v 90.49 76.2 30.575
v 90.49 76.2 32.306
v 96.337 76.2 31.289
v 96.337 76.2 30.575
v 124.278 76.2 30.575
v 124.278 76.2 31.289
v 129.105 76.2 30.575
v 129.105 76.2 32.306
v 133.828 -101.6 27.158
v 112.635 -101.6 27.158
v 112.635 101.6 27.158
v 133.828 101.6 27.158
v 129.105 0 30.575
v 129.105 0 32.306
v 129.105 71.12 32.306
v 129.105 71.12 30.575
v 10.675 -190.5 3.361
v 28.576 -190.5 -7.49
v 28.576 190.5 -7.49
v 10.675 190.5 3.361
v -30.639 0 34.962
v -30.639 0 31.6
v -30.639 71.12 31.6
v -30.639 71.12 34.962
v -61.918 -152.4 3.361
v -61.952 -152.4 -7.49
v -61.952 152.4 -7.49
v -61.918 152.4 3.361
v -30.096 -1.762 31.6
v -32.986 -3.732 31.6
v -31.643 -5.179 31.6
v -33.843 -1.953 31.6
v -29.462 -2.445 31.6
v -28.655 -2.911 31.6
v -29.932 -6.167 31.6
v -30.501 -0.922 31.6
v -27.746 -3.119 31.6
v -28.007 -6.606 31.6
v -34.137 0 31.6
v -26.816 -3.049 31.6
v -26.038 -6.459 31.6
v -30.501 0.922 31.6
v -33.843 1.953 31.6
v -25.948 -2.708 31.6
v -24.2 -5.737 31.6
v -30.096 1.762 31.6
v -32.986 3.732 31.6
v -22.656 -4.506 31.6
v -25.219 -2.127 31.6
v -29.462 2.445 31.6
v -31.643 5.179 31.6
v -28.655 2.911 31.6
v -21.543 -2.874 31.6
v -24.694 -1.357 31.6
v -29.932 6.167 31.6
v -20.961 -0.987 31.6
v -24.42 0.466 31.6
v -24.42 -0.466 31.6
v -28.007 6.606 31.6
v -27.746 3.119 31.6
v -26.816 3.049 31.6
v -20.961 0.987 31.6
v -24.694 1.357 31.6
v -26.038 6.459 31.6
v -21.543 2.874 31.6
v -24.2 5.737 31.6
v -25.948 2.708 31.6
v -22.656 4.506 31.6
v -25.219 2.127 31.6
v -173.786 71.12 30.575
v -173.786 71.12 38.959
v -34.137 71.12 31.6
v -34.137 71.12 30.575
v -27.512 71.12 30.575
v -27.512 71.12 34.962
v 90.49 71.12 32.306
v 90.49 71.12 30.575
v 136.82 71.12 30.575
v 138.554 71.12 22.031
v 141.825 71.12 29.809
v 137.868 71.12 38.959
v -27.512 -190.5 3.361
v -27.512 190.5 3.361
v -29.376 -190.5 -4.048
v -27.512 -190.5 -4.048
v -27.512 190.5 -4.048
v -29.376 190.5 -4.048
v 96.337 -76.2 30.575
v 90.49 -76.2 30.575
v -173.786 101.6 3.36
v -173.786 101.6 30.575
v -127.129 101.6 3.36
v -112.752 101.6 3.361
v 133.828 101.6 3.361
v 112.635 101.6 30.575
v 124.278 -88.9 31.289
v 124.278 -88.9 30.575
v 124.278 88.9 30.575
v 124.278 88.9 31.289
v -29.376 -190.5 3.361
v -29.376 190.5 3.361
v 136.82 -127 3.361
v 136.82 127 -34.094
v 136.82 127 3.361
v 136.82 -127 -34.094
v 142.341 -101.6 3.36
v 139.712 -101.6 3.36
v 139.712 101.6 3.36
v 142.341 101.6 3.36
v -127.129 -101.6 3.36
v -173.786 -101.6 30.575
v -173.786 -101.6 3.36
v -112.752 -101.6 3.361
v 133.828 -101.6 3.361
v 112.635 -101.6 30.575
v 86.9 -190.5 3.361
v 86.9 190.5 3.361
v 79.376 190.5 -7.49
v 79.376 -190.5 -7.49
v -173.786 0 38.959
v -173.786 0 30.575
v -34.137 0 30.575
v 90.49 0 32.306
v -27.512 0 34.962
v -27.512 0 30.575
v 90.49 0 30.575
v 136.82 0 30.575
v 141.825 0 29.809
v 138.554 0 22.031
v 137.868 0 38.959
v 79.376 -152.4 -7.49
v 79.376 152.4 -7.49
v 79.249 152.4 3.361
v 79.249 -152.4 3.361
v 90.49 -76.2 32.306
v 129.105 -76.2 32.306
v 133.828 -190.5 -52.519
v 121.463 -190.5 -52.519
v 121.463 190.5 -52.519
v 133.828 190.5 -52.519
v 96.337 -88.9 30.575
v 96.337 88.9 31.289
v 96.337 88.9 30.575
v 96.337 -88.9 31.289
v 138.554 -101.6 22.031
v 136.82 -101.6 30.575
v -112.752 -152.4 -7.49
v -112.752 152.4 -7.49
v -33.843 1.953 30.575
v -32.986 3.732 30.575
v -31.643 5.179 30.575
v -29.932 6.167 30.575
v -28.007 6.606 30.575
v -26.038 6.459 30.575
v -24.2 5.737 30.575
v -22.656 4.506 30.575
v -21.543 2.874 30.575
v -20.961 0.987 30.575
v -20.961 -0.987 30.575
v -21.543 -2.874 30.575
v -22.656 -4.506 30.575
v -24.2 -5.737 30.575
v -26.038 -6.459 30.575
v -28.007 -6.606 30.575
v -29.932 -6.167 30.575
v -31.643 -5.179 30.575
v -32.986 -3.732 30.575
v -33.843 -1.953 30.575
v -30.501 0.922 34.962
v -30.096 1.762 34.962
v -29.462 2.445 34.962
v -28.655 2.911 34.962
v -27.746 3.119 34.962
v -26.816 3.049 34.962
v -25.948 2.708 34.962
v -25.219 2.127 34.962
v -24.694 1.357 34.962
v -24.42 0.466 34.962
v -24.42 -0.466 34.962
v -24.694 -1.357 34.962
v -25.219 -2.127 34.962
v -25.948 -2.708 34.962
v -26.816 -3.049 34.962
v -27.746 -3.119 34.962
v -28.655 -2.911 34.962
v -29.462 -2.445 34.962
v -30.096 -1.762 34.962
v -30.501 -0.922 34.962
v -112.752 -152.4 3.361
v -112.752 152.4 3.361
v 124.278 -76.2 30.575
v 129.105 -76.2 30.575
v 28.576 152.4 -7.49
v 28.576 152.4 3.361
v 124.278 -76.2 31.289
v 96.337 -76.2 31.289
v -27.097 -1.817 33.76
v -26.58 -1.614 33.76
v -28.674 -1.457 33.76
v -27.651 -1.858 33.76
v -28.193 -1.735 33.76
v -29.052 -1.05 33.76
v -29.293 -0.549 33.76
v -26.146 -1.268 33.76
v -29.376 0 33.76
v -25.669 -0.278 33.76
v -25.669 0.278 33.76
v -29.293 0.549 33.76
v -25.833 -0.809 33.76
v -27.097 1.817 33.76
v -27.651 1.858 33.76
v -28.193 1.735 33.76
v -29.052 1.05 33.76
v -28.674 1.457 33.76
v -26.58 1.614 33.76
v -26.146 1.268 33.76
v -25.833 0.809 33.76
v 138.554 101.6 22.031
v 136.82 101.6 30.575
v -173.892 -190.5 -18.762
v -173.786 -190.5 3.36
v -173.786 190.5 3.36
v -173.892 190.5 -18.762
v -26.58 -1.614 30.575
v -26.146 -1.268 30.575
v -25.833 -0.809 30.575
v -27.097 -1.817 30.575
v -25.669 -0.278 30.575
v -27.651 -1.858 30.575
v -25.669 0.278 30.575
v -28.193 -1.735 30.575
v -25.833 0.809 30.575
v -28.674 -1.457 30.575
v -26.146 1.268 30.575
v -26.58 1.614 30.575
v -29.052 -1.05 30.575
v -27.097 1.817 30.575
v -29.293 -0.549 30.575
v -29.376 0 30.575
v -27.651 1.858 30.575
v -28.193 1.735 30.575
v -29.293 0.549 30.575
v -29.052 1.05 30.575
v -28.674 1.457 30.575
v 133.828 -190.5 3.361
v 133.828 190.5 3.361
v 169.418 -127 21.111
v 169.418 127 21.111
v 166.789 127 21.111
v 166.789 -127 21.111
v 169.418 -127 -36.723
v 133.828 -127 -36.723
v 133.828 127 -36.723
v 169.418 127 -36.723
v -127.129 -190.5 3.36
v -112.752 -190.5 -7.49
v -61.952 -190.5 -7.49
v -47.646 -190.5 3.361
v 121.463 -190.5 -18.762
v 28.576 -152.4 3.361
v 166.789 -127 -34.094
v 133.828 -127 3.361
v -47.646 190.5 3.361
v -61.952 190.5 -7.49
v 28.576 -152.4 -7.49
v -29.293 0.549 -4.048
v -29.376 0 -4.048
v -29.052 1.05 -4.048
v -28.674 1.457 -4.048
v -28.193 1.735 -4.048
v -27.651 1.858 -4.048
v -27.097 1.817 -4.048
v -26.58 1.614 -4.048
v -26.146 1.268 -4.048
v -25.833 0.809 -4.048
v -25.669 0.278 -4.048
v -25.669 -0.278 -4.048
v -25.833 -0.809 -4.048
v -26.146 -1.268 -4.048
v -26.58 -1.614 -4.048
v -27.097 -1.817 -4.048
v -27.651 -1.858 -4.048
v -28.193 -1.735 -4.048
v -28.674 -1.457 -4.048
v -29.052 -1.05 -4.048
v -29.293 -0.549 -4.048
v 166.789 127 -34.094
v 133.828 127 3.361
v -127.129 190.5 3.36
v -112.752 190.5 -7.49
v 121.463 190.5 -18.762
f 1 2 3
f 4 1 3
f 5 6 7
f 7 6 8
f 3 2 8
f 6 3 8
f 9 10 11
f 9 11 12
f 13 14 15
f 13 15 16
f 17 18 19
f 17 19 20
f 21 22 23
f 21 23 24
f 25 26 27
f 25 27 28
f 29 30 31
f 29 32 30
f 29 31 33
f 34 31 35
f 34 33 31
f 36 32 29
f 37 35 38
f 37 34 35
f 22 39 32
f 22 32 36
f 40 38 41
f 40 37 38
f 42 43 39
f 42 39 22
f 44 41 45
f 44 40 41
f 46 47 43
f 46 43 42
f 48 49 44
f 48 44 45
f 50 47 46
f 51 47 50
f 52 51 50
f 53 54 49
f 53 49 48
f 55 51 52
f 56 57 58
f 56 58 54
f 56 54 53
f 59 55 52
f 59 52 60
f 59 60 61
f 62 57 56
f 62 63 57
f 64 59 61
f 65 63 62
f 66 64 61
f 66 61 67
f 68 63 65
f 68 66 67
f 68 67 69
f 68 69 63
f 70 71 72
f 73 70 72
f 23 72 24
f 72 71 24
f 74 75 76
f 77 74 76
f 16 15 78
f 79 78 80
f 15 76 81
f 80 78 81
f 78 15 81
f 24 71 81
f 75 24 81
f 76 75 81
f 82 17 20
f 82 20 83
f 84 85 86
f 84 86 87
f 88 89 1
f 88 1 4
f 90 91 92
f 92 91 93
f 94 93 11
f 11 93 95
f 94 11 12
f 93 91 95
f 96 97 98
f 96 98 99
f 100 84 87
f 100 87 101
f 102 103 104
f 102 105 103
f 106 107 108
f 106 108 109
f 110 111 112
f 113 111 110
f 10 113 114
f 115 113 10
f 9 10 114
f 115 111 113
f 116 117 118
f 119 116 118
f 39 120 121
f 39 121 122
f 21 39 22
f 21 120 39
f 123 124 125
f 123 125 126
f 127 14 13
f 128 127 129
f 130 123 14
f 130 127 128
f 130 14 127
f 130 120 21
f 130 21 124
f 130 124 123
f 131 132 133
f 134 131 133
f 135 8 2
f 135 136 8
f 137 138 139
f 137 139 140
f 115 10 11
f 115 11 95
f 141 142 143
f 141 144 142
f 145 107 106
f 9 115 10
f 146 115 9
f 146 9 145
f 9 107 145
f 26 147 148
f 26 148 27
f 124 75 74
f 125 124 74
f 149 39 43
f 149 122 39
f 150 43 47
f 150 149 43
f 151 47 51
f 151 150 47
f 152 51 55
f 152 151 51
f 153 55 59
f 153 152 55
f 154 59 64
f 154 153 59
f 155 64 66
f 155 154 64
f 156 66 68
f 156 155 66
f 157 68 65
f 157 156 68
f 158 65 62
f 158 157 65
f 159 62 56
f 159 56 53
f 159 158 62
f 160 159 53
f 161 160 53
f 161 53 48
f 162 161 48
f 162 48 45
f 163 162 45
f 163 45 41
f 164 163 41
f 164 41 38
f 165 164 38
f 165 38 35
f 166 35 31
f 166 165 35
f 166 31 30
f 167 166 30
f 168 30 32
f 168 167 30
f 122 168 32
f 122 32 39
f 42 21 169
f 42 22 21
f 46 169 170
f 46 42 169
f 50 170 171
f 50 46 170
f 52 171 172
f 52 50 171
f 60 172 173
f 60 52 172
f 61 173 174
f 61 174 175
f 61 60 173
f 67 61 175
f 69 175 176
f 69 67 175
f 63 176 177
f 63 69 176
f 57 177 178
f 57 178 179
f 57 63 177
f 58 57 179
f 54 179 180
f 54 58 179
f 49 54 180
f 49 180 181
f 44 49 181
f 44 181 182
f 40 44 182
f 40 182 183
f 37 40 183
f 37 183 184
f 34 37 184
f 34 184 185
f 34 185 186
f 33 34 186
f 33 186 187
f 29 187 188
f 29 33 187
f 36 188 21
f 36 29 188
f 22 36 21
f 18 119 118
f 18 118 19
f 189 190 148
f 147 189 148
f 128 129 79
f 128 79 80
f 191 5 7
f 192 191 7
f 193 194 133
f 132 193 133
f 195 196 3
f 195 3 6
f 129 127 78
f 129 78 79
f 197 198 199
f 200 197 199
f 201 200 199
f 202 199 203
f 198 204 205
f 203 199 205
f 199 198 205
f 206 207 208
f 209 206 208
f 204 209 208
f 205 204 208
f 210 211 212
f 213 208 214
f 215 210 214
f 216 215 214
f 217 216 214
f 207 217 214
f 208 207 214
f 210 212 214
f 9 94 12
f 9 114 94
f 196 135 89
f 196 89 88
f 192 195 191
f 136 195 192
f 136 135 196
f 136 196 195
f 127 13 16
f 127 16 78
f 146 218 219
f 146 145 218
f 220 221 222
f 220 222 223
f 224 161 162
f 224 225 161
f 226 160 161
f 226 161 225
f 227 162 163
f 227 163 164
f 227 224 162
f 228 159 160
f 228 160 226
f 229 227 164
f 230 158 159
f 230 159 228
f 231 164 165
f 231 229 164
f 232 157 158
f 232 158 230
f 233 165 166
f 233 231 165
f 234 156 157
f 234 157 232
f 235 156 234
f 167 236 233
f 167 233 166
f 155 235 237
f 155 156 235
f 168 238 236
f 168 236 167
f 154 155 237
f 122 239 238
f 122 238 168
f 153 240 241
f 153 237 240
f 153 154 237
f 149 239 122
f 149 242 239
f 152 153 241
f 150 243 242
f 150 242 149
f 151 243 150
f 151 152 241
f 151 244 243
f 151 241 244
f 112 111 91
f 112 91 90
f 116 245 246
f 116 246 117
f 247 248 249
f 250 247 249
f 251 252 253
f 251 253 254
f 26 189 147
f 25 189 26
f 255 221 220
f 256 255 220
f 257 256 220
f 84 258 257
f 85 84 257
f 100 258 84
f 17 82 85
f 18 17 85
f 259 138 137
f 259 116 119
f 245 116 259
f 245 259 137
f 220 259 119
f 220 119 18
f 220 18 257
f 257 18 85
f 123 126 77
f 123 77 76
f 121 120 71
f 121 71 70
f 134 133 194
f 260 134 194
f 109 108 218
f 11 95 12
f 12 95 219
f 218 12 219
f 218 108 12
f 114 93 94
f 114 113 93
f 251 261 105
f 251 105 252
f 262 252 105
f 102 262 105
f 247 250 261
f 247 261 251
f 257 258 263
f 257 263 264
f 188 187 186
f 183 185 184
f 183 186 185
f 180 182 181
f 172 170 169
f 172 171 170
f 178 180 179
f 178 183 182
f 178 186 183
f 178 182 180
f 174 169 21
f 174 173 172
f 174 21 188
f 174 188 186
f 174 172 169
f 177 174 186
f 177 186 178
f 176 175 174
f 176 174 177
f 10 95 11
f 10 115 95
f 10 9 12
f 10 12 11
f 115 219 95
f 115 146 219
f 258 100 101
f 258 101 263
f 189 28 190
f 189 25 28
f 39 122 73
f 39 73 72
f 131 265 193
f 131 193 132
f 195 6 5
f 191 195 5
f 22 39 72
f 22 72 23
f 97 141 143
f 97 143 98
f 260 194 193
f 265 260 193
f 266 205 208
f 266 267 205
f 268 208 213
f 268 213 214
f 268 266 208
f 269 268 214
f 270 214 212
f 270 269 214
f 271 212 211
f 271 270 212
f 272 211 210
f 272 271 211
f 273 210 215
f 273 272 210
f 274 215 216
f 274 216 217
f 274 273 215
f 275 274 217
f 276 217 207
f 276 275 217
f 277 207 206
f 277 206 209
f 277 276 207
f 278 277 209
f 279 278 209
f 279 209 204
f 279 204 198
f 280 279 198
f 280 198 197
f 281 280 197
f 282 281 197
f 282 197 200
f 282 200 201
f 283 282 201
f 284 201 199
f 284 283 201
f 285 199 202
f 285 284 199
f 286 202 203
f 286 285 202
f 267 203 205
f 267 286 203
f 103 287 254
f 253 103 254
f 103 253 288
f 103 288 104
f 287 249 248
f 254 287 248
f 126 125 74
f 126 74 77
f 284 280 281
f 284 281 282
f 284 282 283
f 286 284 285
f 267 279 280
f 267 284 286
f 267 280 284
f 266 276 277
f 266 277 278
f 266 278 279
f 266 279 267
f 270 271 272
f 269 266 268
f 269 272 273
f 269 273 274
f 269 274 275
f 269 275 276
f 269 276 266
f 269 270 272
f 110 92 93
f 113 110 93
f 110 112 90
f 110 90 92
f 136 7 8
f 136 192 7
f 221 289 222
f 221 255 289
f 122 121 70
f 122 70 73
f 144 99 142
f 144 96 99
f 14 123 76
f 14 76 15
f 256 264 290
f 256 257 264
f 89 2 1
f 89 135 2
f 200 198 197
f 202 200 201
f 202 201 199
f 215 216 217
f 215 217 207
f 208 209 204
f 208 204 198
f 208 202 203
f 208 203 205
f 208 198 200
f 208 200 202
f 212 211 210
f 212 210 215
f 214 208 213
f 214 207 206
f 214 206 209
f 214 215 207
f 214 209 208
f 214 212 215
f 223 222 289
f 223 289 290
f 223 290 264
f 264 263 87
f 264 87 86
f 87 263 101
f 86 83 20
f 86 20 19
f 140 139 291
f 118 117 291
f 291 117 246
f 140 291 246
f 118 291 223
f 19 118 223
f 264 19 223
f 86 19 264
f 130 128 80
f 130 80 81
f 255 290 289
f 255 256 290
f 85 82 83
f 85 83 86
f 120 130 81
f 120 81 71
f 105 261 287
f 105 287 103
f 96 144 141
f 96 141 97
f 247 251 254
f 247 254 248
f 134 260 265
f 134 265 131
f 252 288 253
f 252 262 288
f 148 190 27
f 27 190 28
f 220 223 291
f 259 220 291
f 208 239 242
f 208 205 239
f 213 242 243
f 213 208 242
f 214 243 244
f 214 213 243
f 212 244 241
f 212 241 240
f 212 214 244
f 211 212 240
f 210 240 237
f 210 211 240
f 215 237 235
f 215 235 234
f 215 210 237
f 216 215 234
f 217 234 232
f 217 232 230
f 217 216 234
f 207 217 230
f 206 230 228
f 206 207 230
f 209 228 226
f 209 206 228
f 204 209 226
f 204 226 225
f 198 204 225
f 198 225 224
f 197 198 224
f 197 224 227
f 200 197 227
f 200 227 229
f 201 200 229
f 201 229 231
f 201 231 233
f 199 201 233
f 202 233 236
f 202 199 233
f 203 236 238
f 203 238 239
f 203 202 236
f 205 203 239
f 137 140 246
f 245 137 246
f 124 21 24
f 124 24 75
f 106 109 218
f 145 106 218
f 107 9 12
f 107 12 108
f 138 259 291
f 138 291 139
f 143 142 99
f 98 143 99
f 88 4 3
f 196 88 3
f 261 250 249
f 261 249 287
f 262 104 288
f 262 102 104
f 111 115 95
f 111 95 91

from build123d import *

# Parameters (mm, degrees)
F1_DEPTH  = 190.5
F2_DEPTH  = 152.4
F0_W      = 1.8636145309
F0_H      = 27.2141208457
F3_DEPTH  = 101.6
F0_H_2    = 3.1851885769
F0_H_3    = 7.4091651964
F6_DEPTH  = 127
F7_DEPTH  = 101.6
F8_DEPTH  = 88.9
F9_DEPTH  = 76.2
F10_DEPTH = 71.12


with BuildPart() as f1:
    # F0 (on Front) → F1 (new body, symmetric)
    with BuildSketch(Plane.XZ):
        Polygon((-127.1288654061, 3.3602740393), (-173.7859473037, 3.3602740393), (-173.8923100857, -18.7623016536), (121.4632987976, -18.7623016536), (121.4632987976, -52.5190801178), (133.8279108456, -52.5190801178), (133.8279108456, -36.7227010429), (133.8279108456, 3.3609198822), (86.8995636396, 3.3609198822), (79.3755978542, -7.4902105568), (28.5755978542, -7.4902105568), (10.6749085502, 3.3609198822), (-27.5120586157, 3.3609198822), (-27.5120586157, -4.0482453142), (-29.3756731466, -4.0482453142), (-29.3756731466, 3.3609198822), (-47.6464486061, 3.3609198822), (-61.951972467, -7.4902105568), (-112.751972467, -7.4902105568), align=None)
    extrude(amount=F1_DEPTH, both=True)


with BuildPart() as f2:
    # F0 (on Front) → F2 (new body, symmetric)
    with BuildSketch(Plane.XZ):
        Polygon((-112.751972467, 3.3609198822), (-112.751972467, -7.4902105568), (-61.951972467, -7.4902105568), (-61.9183145463, 3.3609198822), align=None)
    extrude(amount=F2_DEPTH, both=True)


with BuildPart() as f2b:
    # F0 (on Front) → F2, piece 2 (new body, symmetric)
    with BuildSketch(Plane.XZ):
        Polygon((28.5755978542, 3.3609198822), (28.5755978542, -7.4902105568), (79.3755978542, -7.4902105568), (79.2492181063, 3.3609198822), align=None)
    extrude(amount=F2_DEPTH, both=True)


with BuildPart() as f3:
    # F0 (on Front) → F3 (new body, symmetric)
    with BuildSketch(Plane.XZ):
        Polygon((90.4897078872, 30.5750407279), (-27.5120586157, 30.5750407279), (-27.5120586157, 3.3609198822), (10.6749085502, 3.3609198822), (28.5755978542, 3.3609198822), (79.2492181063, 3.3609198822), (86.8995636396, 3.3609198822), (133.8279108456, 3.3609198822), (133.8279108456, 27.1575767547), (112.6352027059, 27.1575767547), (112.6352027059, 30.5750407279), (96.3365361094, 30.5750407279), align=None)
        Polygon((-173.7859473037, 30.5750407279), (-173.7859473037, 3.3602740393), (-127.1288654061, 3.3602740393), (-112.751972467, 3.3609198822), (-61.9183145463, 3.3609198822), (-47.6464486061, 3.3609198822), (-29.3756731466, 3.3609198822), (-29.3756731466, 30.5750407279), (-34.1368317604, 30.5750407279), align=None)
        with Locations((-28.4438658811, 16.967980305)):
            Rectangle(F0_W, F0_H)
    extrude(amount=F3_DEPTH, both=True)


with BuildPart() as f4:
    # F0 (on Front) → F4 (revolve)
    with BuildSketch(Plane.XZ):
        with Locations((-28.4438658811, 32.1676350163)):
            Rectangle(F0_W, F0_H_2)
        with Locations((-28.4438658811, 16.967980305)):
            Rectangle(F0_W, F0_H)
        with Locations((-28.4438658811, -0.343662716)):
            Rectangle(F0_W, F0_H_3)
    revolve(axis=Axis((-27.5120586157, 0, 14.7883250342), (0, 0, -1)))


with BuildPart() as f5:
    # F0 (on Front) → F5 (revolve)
    with BuildSketch(Plane.XZ):
        Polygon((-34.1368317604, 31.5995030105), (-34.1368317604, 30.5750407279), (-29.3756731466, 30.5750407279), (-29.3756731466, 33.7602293047), (-27.5120586157, 33.7602293047), (-27.5120586157, 34.9623337388), (-30.6394901127, 34.9623337388), (-30.6394901127, 31.5995030105), align=None)
    revolve(axis=Axis((-27.5120586157, 0, 14.7883250342), (0, 0, -1)))


with BuildPart() as f6:
    # F0 (on Front) → F6 (new body, symmetric)
    with BuildSketch(Plane.XZ):
        Polygon((133.8279108456, 3.3609198822), (133.8279108456, -36.7227010429), (169.4176793098, -36.7227010429), (169.4176793098, 21.1112946272), (166.7888611555, 21.1112946272), (166.7888611555, -34.0938866138), (136.8203312159, -34.0938866138), (136.8203312159, 3.3609198822), align=None)
    extrude(amount=F6_DEPTH, both=True)


with BuildPart() as f7:
    # F0 (on Front) → F7 (new body, symmetric)
    with BuildSketch(Plane.XZ):
        Polygon((124.2782771587, 30.5750407279), (112.6352027059, 30.5750407279), (112.6352027059, 27.1575767547), (133.8279108456, 27.1575767547), (133.8279108456, 30.5750407279), (129.1052103043, 30.5750407279), align=None)
        Polygon((142.3408389091, 3.3602740393), (138.5535198667, 22.0308401975), (136.8203312159, 30.5750407279), (133.8279108456, 30.5750407279), (133.8279108456, 27.1575767547), (139.712035656, 3.3602740393), align=None)
    extrude(amount=F7_DEPTH, both=True)


with BuildPart() as f8:
    # F0 (on Front) → F8 (new body, symmetric)
    with BuildSketch(Plane.XZ):
        Polygon((96.3365361094, 31.289357692), (96.3365361094, 30.5750407279), (112.6352027059, 30.5750407279), (124.2782771587, 30.5750407279), (124.2782771587, 31.289357692), align=None)
    extrude(amount=F8_DEPTH, both=True)


with BuildPart() as f9:
    # F0 (on Front) → F9 (new body, symmetric)
    with BuildSketch(Plane.XZ):
        Polygon((90.4897078872, 32.3055572808), (90.4897078872, 30.5750407279), (96.3365361094, 30.5750407279), (96.3365361094, 31.289357692), (124.2782771587, 31.289357692), (124.2782771587, 30.5750407279), (129.1052103043, 30.5750407279), (129.1052103043, 32.3055572808), align=None)
    extrude(amount=F9_DEPTH, both=True)


with BuildPart() as f10:
    # F0 (on Front) → F10 (new body)
    with BuildSketch(Plane.XZ):
        Polygon((-173.7859473037, 38.9586053789), (-173.7859473037, 30.5750407279), (-34.1368317604, 30.5750407279), (-34.1368317604, 31.5995030105), (-30.6394901127, 31.5995030105), (-30.6394901127, 34.9623337388), (-27.5120586157, 34.9623337388), (-27.5120586157, 33.7602293047), (-27.5120586157, 30.5750407279), (90.4897078872, 30.5750407279), (90.4897078872, 32.3055572808), (129.1052103043, 32.3055572808), (129.1052103043, 30.5750407279), (133.8279108456, 30.5750407279), (136.8203312159, 30.5750407279), (138.5535198667, 22.0308401975), (141.8251693249, 29.8087727278), (137.8684788942, 38.9586053789), align=None)
    extrude(amount=-F10_DEPTH)


solid = Compound([f1.part, f2.part, f2b.part, f3.part, f4.part, f5.part, f6.part, f7.part, f8.part, f9.part, f10.part])
